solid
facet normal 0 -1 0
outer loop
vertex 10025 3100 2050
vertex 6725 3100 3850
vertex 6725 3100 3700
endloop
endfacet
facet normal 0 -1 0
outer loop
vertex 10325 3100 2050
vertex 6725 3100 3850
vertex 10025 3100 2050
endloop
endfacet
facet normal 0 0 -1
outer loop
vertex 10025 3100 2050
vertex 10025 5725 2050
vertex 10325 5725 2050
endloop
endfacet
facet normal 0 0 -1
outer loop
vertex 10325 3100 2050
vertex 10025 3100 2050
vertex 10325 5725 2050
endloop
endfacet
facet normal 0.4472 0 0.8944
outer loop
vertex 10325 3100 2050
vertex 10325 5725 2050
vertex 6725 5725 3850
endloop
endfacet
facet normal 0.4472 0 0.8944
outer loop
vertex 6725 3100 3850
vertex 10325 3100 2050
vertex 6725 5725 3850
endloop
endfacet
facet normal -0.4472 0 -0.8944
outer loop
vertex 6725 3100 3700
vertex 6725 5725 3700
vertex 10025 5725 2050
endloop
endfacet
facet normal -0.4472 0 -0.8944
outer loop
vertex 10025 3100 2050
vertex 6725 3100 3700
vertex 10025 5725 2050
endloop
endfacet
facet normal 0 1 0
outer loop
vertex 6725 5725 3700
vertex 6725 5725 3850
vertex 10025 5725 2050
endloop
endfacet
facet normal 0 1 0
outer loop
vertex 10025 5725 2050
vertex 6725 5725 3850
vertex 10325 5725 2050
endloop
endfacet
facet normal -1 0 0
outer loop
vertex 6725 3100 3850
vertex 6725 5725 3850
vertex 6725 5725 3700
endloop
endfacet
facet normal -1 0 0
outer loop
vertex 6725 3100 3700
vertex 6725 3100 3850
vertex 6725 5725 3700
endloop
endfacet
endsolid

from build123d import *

# Parameters (mm, degrees)
EXTRUDE_SKETCH010001_DEPTH                     = 2625
EXTRUDE_SKETCH010001_ONTO_SKETCH010_ROLL_ANGLE = 90


with BuildPart() as rampa001:
    # Sketch010 as drawn → Extrude_Sketch010001 (new)
    with BuildSketch(Plane.XY):
        Polygon((6725, 400), (10325, 2200), (10325, 2050), (7025, 400), align=None)
    extrude(amount=-EXTRUDE_SKETCH010001_DEPTH)


with BuildPart() as rampa001_1:
    # Extrude_Sketch010001 onto Sketch010 roll: moved
    add(rampa001.part.rotate(Axis((0, 0, 0), (1, 0, 0)), EXTRUDE_SKETCH010001_ONTO_SKETCH010_ROLL_ANGLE))


with BuildPart() as rampa001_2:
    # Extrude_Sketch010001 onto Sketch010 placement: moved
    add(rampa001_1.part.moved(Location((0, 475, 0))))


with BuildPart() as part_mirroring002:
    # Part__Mirroring002: instance of RAMPA001
    add(rampa001_2.part.mirror(Plane(origin=(0, 3100, 0), x_dir=(1, 0, 0), z_dir=(0, 1, 0))))


with BuildPart() as part_mirroring003:
    # Part__Mirroring003: instance of Part__Mirroring002
    add(part_mirroring002.part.mirror(Plane(origin=(8525, 0, 0), x_dir=(0, -1, 0), z_dir=(1, 0, 0))))


with BuildPart() as part_mirroring003_1:
    # Part__Mirroring003 placement: moved
    add(part_mirroring003.part.moved(Location((0, 0, 1650))))


solid = part_mirroring003_1.part
